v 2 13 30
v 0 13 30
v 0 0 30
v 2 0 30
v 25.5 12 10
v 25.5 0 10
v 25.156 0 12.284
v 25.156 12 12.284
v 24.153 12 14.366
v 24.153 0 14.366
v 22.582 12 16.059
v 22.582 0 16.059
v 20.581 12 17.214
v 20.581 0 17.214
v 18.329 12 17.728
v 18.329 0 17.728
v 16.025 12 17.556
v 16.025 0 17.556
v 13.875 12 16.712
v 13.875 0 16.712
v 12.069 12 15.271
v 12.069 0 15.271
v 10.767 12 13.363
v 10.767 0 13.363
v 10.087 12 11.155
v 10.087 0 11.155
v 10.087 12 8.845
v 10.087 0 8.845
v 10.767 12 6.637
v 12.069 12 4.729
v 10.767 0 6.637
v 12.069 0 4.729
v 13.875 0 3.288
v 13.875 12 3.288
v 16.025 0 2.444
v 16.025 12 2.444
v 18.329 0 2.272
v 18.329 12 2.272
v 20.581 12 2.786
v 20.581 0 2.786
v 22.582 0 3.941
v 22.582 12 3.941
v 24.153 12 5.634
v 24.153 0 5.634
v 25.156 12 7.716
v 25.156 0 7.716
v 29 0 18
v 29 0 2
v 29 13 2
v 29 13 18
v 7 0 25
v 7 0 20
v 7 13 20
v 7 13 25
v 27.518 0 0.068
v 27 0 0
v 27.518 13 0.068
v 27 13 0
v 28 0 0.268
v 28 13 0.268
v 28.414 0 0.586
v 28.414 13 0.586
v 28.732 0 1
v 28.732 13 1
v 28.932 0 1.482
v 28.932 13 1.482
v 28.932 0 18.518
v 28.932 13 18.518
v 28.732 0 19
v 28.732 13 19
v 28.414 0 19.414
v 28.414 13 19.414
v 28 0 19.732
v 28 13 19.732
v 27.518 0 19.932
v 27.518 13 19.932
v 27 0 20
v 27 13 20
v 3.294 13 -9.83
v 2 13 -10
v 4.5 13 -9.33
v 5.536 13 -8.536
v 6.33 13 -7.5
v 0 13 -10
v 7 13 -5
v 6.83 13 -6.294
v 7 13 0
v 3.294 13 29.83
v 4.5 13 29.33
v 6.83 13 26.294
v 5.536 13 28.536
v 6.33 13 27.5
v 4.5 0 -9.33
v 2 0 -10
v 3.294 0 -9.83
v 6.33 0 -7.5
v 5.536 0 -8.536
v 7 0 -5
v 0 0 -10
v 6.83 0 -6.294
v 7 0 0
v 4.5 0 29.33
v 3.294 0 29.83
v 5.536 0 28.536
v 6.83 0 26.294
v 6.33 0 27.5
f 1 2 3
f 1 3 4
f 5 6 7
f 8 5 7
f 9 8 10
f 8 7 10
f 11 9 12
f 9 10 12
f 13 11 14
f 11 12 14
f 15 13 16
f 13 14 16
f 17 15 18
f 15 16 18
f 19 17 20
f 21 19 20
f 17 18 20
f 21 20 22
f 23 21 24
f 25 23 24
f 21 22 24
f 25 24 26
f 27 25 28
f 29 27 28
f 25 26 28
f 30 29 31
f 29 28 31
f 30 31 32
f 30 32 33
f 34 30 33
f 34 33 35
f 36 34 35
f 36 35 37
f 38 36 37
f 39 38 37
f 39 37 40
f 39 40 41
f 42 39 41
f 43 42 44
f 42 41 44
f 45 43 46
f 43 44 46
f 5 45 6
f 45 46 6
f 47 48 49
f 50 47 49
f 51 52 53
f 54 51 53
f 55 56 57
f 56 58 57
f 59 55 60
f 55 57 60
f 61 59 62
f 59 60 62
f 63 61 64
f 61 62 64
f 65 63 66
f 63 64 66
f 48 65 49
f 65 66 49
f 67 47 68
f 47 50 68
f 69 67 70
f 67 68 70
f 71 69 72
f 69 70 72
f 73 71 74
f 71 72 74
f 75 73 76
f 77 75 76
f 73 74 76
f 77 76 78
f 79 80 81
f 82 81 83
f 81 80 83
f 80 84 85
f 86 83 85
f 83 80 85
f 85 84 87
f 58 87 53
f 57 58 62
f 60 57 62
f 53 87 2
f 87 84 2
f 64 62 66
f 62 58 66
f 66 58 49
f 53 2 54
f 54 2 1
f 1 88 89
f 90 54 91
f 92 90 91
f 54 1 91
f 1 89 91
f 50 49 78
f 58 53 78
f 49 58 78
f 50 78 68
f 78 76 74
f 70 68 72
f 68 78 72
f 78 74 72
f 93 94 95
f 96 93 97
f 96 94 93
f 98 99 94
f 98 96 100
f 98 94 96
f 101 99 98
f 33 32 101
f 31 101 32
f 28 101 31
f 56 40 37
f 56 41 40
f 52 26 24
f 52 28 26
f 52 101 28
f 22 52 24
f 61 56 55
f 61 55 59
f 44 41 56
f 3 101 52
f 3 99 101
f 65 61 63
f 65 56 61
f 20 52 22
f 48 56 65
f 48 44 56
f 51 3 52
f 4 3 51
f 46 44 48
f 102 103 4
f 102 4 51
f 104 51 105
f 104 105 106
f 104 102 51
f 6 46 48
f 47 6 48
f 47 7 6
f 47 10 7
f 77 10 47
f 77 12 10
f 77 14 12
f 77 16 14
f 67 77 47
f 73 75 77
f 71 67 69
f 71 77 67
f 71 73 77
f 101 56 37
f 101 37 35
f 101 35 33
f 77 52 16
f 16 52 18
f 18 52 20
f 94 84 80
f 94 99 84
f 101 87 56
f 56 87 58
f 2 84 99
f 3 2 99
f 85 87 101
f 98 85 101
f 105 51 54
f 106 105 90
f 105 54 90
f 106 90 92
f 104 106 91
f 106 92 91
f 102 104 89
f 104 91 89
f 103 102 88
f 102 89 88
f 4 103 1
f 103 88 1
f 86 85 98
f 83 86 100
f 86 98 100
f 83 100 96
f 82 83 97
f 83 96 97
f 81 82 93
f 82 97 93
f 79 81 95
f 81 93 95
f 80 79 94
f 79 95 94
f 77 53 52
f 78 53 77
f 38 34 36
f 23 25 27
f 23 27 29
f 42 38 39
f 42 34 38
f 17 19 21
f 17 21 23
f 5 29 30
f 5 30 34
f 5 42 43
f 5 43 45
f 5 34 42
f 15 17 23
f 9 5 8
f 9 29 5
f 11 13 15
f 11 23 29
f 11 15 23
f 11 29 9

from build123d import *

# Parameters (mm, degrees)
F0_W     = 29
F0_H     = 13
F1_DEPTH = 20
F2_R     = 7.75
F3_DEPTH = 12
F5_DEPTH = 10
F6_W     = 7
F6_H     = 13
F7_DEPTH = 10
F8_R     = 5
F9_R     = 2


with BuildPart() as f1:
    # F0 (on Top) → F1 (new body)
    with BuildSketch(Plane.XY):
        with Locations((14.5, 6.5)):
            Rectangle(F0_W, F0_H)
    extrude(amount=F1_DEPTH)

    # F2 (on face) → F3 (cut)
    with BuildSketch(Plane.XZ):
        with Locations((17.75, 10)):
            Circle(F2_R)
    extrude(amount=-F3_DEPTH, mode=Mode.SUBTRACT)

    # F4 (on face) → F5 (join)
    with BuildSketch(Plane.XY.offset(20)):
        Polygon((2, 0), (7, 0), (7, 13), (0, 13), (0, 0), align=None)
    extrude(amount=F5_DEPTH)

    # F6 (on face) → F7 (join)
    with BuildSketch(Plane(origin=(0, 0, 0), x_dir=(1, 0, 0), z_dir=(0, 0, -1))):
        with Locations((3.5, -6.5)):
            Rectangle(F6_W, F6_H)
    extrude(amount=F7_DEPTH)

    # F8
    f8_edges = [f1.edges().sort_by_distance(p)[0] for p in [
        (7, 6.5, 30),
        (7, 6.5, -10),
    ]]
    fillet(f8_edges, radius=F8_R)

    # F9
    f9_edges = [f1.edges().sort_by_distance(p)[0] for p in [
        (29, 6.5, 20),
        (29, 6.5, 0),
    ]]
    fillet(f9_edges, radius=F9_R)


solid = f1.part
